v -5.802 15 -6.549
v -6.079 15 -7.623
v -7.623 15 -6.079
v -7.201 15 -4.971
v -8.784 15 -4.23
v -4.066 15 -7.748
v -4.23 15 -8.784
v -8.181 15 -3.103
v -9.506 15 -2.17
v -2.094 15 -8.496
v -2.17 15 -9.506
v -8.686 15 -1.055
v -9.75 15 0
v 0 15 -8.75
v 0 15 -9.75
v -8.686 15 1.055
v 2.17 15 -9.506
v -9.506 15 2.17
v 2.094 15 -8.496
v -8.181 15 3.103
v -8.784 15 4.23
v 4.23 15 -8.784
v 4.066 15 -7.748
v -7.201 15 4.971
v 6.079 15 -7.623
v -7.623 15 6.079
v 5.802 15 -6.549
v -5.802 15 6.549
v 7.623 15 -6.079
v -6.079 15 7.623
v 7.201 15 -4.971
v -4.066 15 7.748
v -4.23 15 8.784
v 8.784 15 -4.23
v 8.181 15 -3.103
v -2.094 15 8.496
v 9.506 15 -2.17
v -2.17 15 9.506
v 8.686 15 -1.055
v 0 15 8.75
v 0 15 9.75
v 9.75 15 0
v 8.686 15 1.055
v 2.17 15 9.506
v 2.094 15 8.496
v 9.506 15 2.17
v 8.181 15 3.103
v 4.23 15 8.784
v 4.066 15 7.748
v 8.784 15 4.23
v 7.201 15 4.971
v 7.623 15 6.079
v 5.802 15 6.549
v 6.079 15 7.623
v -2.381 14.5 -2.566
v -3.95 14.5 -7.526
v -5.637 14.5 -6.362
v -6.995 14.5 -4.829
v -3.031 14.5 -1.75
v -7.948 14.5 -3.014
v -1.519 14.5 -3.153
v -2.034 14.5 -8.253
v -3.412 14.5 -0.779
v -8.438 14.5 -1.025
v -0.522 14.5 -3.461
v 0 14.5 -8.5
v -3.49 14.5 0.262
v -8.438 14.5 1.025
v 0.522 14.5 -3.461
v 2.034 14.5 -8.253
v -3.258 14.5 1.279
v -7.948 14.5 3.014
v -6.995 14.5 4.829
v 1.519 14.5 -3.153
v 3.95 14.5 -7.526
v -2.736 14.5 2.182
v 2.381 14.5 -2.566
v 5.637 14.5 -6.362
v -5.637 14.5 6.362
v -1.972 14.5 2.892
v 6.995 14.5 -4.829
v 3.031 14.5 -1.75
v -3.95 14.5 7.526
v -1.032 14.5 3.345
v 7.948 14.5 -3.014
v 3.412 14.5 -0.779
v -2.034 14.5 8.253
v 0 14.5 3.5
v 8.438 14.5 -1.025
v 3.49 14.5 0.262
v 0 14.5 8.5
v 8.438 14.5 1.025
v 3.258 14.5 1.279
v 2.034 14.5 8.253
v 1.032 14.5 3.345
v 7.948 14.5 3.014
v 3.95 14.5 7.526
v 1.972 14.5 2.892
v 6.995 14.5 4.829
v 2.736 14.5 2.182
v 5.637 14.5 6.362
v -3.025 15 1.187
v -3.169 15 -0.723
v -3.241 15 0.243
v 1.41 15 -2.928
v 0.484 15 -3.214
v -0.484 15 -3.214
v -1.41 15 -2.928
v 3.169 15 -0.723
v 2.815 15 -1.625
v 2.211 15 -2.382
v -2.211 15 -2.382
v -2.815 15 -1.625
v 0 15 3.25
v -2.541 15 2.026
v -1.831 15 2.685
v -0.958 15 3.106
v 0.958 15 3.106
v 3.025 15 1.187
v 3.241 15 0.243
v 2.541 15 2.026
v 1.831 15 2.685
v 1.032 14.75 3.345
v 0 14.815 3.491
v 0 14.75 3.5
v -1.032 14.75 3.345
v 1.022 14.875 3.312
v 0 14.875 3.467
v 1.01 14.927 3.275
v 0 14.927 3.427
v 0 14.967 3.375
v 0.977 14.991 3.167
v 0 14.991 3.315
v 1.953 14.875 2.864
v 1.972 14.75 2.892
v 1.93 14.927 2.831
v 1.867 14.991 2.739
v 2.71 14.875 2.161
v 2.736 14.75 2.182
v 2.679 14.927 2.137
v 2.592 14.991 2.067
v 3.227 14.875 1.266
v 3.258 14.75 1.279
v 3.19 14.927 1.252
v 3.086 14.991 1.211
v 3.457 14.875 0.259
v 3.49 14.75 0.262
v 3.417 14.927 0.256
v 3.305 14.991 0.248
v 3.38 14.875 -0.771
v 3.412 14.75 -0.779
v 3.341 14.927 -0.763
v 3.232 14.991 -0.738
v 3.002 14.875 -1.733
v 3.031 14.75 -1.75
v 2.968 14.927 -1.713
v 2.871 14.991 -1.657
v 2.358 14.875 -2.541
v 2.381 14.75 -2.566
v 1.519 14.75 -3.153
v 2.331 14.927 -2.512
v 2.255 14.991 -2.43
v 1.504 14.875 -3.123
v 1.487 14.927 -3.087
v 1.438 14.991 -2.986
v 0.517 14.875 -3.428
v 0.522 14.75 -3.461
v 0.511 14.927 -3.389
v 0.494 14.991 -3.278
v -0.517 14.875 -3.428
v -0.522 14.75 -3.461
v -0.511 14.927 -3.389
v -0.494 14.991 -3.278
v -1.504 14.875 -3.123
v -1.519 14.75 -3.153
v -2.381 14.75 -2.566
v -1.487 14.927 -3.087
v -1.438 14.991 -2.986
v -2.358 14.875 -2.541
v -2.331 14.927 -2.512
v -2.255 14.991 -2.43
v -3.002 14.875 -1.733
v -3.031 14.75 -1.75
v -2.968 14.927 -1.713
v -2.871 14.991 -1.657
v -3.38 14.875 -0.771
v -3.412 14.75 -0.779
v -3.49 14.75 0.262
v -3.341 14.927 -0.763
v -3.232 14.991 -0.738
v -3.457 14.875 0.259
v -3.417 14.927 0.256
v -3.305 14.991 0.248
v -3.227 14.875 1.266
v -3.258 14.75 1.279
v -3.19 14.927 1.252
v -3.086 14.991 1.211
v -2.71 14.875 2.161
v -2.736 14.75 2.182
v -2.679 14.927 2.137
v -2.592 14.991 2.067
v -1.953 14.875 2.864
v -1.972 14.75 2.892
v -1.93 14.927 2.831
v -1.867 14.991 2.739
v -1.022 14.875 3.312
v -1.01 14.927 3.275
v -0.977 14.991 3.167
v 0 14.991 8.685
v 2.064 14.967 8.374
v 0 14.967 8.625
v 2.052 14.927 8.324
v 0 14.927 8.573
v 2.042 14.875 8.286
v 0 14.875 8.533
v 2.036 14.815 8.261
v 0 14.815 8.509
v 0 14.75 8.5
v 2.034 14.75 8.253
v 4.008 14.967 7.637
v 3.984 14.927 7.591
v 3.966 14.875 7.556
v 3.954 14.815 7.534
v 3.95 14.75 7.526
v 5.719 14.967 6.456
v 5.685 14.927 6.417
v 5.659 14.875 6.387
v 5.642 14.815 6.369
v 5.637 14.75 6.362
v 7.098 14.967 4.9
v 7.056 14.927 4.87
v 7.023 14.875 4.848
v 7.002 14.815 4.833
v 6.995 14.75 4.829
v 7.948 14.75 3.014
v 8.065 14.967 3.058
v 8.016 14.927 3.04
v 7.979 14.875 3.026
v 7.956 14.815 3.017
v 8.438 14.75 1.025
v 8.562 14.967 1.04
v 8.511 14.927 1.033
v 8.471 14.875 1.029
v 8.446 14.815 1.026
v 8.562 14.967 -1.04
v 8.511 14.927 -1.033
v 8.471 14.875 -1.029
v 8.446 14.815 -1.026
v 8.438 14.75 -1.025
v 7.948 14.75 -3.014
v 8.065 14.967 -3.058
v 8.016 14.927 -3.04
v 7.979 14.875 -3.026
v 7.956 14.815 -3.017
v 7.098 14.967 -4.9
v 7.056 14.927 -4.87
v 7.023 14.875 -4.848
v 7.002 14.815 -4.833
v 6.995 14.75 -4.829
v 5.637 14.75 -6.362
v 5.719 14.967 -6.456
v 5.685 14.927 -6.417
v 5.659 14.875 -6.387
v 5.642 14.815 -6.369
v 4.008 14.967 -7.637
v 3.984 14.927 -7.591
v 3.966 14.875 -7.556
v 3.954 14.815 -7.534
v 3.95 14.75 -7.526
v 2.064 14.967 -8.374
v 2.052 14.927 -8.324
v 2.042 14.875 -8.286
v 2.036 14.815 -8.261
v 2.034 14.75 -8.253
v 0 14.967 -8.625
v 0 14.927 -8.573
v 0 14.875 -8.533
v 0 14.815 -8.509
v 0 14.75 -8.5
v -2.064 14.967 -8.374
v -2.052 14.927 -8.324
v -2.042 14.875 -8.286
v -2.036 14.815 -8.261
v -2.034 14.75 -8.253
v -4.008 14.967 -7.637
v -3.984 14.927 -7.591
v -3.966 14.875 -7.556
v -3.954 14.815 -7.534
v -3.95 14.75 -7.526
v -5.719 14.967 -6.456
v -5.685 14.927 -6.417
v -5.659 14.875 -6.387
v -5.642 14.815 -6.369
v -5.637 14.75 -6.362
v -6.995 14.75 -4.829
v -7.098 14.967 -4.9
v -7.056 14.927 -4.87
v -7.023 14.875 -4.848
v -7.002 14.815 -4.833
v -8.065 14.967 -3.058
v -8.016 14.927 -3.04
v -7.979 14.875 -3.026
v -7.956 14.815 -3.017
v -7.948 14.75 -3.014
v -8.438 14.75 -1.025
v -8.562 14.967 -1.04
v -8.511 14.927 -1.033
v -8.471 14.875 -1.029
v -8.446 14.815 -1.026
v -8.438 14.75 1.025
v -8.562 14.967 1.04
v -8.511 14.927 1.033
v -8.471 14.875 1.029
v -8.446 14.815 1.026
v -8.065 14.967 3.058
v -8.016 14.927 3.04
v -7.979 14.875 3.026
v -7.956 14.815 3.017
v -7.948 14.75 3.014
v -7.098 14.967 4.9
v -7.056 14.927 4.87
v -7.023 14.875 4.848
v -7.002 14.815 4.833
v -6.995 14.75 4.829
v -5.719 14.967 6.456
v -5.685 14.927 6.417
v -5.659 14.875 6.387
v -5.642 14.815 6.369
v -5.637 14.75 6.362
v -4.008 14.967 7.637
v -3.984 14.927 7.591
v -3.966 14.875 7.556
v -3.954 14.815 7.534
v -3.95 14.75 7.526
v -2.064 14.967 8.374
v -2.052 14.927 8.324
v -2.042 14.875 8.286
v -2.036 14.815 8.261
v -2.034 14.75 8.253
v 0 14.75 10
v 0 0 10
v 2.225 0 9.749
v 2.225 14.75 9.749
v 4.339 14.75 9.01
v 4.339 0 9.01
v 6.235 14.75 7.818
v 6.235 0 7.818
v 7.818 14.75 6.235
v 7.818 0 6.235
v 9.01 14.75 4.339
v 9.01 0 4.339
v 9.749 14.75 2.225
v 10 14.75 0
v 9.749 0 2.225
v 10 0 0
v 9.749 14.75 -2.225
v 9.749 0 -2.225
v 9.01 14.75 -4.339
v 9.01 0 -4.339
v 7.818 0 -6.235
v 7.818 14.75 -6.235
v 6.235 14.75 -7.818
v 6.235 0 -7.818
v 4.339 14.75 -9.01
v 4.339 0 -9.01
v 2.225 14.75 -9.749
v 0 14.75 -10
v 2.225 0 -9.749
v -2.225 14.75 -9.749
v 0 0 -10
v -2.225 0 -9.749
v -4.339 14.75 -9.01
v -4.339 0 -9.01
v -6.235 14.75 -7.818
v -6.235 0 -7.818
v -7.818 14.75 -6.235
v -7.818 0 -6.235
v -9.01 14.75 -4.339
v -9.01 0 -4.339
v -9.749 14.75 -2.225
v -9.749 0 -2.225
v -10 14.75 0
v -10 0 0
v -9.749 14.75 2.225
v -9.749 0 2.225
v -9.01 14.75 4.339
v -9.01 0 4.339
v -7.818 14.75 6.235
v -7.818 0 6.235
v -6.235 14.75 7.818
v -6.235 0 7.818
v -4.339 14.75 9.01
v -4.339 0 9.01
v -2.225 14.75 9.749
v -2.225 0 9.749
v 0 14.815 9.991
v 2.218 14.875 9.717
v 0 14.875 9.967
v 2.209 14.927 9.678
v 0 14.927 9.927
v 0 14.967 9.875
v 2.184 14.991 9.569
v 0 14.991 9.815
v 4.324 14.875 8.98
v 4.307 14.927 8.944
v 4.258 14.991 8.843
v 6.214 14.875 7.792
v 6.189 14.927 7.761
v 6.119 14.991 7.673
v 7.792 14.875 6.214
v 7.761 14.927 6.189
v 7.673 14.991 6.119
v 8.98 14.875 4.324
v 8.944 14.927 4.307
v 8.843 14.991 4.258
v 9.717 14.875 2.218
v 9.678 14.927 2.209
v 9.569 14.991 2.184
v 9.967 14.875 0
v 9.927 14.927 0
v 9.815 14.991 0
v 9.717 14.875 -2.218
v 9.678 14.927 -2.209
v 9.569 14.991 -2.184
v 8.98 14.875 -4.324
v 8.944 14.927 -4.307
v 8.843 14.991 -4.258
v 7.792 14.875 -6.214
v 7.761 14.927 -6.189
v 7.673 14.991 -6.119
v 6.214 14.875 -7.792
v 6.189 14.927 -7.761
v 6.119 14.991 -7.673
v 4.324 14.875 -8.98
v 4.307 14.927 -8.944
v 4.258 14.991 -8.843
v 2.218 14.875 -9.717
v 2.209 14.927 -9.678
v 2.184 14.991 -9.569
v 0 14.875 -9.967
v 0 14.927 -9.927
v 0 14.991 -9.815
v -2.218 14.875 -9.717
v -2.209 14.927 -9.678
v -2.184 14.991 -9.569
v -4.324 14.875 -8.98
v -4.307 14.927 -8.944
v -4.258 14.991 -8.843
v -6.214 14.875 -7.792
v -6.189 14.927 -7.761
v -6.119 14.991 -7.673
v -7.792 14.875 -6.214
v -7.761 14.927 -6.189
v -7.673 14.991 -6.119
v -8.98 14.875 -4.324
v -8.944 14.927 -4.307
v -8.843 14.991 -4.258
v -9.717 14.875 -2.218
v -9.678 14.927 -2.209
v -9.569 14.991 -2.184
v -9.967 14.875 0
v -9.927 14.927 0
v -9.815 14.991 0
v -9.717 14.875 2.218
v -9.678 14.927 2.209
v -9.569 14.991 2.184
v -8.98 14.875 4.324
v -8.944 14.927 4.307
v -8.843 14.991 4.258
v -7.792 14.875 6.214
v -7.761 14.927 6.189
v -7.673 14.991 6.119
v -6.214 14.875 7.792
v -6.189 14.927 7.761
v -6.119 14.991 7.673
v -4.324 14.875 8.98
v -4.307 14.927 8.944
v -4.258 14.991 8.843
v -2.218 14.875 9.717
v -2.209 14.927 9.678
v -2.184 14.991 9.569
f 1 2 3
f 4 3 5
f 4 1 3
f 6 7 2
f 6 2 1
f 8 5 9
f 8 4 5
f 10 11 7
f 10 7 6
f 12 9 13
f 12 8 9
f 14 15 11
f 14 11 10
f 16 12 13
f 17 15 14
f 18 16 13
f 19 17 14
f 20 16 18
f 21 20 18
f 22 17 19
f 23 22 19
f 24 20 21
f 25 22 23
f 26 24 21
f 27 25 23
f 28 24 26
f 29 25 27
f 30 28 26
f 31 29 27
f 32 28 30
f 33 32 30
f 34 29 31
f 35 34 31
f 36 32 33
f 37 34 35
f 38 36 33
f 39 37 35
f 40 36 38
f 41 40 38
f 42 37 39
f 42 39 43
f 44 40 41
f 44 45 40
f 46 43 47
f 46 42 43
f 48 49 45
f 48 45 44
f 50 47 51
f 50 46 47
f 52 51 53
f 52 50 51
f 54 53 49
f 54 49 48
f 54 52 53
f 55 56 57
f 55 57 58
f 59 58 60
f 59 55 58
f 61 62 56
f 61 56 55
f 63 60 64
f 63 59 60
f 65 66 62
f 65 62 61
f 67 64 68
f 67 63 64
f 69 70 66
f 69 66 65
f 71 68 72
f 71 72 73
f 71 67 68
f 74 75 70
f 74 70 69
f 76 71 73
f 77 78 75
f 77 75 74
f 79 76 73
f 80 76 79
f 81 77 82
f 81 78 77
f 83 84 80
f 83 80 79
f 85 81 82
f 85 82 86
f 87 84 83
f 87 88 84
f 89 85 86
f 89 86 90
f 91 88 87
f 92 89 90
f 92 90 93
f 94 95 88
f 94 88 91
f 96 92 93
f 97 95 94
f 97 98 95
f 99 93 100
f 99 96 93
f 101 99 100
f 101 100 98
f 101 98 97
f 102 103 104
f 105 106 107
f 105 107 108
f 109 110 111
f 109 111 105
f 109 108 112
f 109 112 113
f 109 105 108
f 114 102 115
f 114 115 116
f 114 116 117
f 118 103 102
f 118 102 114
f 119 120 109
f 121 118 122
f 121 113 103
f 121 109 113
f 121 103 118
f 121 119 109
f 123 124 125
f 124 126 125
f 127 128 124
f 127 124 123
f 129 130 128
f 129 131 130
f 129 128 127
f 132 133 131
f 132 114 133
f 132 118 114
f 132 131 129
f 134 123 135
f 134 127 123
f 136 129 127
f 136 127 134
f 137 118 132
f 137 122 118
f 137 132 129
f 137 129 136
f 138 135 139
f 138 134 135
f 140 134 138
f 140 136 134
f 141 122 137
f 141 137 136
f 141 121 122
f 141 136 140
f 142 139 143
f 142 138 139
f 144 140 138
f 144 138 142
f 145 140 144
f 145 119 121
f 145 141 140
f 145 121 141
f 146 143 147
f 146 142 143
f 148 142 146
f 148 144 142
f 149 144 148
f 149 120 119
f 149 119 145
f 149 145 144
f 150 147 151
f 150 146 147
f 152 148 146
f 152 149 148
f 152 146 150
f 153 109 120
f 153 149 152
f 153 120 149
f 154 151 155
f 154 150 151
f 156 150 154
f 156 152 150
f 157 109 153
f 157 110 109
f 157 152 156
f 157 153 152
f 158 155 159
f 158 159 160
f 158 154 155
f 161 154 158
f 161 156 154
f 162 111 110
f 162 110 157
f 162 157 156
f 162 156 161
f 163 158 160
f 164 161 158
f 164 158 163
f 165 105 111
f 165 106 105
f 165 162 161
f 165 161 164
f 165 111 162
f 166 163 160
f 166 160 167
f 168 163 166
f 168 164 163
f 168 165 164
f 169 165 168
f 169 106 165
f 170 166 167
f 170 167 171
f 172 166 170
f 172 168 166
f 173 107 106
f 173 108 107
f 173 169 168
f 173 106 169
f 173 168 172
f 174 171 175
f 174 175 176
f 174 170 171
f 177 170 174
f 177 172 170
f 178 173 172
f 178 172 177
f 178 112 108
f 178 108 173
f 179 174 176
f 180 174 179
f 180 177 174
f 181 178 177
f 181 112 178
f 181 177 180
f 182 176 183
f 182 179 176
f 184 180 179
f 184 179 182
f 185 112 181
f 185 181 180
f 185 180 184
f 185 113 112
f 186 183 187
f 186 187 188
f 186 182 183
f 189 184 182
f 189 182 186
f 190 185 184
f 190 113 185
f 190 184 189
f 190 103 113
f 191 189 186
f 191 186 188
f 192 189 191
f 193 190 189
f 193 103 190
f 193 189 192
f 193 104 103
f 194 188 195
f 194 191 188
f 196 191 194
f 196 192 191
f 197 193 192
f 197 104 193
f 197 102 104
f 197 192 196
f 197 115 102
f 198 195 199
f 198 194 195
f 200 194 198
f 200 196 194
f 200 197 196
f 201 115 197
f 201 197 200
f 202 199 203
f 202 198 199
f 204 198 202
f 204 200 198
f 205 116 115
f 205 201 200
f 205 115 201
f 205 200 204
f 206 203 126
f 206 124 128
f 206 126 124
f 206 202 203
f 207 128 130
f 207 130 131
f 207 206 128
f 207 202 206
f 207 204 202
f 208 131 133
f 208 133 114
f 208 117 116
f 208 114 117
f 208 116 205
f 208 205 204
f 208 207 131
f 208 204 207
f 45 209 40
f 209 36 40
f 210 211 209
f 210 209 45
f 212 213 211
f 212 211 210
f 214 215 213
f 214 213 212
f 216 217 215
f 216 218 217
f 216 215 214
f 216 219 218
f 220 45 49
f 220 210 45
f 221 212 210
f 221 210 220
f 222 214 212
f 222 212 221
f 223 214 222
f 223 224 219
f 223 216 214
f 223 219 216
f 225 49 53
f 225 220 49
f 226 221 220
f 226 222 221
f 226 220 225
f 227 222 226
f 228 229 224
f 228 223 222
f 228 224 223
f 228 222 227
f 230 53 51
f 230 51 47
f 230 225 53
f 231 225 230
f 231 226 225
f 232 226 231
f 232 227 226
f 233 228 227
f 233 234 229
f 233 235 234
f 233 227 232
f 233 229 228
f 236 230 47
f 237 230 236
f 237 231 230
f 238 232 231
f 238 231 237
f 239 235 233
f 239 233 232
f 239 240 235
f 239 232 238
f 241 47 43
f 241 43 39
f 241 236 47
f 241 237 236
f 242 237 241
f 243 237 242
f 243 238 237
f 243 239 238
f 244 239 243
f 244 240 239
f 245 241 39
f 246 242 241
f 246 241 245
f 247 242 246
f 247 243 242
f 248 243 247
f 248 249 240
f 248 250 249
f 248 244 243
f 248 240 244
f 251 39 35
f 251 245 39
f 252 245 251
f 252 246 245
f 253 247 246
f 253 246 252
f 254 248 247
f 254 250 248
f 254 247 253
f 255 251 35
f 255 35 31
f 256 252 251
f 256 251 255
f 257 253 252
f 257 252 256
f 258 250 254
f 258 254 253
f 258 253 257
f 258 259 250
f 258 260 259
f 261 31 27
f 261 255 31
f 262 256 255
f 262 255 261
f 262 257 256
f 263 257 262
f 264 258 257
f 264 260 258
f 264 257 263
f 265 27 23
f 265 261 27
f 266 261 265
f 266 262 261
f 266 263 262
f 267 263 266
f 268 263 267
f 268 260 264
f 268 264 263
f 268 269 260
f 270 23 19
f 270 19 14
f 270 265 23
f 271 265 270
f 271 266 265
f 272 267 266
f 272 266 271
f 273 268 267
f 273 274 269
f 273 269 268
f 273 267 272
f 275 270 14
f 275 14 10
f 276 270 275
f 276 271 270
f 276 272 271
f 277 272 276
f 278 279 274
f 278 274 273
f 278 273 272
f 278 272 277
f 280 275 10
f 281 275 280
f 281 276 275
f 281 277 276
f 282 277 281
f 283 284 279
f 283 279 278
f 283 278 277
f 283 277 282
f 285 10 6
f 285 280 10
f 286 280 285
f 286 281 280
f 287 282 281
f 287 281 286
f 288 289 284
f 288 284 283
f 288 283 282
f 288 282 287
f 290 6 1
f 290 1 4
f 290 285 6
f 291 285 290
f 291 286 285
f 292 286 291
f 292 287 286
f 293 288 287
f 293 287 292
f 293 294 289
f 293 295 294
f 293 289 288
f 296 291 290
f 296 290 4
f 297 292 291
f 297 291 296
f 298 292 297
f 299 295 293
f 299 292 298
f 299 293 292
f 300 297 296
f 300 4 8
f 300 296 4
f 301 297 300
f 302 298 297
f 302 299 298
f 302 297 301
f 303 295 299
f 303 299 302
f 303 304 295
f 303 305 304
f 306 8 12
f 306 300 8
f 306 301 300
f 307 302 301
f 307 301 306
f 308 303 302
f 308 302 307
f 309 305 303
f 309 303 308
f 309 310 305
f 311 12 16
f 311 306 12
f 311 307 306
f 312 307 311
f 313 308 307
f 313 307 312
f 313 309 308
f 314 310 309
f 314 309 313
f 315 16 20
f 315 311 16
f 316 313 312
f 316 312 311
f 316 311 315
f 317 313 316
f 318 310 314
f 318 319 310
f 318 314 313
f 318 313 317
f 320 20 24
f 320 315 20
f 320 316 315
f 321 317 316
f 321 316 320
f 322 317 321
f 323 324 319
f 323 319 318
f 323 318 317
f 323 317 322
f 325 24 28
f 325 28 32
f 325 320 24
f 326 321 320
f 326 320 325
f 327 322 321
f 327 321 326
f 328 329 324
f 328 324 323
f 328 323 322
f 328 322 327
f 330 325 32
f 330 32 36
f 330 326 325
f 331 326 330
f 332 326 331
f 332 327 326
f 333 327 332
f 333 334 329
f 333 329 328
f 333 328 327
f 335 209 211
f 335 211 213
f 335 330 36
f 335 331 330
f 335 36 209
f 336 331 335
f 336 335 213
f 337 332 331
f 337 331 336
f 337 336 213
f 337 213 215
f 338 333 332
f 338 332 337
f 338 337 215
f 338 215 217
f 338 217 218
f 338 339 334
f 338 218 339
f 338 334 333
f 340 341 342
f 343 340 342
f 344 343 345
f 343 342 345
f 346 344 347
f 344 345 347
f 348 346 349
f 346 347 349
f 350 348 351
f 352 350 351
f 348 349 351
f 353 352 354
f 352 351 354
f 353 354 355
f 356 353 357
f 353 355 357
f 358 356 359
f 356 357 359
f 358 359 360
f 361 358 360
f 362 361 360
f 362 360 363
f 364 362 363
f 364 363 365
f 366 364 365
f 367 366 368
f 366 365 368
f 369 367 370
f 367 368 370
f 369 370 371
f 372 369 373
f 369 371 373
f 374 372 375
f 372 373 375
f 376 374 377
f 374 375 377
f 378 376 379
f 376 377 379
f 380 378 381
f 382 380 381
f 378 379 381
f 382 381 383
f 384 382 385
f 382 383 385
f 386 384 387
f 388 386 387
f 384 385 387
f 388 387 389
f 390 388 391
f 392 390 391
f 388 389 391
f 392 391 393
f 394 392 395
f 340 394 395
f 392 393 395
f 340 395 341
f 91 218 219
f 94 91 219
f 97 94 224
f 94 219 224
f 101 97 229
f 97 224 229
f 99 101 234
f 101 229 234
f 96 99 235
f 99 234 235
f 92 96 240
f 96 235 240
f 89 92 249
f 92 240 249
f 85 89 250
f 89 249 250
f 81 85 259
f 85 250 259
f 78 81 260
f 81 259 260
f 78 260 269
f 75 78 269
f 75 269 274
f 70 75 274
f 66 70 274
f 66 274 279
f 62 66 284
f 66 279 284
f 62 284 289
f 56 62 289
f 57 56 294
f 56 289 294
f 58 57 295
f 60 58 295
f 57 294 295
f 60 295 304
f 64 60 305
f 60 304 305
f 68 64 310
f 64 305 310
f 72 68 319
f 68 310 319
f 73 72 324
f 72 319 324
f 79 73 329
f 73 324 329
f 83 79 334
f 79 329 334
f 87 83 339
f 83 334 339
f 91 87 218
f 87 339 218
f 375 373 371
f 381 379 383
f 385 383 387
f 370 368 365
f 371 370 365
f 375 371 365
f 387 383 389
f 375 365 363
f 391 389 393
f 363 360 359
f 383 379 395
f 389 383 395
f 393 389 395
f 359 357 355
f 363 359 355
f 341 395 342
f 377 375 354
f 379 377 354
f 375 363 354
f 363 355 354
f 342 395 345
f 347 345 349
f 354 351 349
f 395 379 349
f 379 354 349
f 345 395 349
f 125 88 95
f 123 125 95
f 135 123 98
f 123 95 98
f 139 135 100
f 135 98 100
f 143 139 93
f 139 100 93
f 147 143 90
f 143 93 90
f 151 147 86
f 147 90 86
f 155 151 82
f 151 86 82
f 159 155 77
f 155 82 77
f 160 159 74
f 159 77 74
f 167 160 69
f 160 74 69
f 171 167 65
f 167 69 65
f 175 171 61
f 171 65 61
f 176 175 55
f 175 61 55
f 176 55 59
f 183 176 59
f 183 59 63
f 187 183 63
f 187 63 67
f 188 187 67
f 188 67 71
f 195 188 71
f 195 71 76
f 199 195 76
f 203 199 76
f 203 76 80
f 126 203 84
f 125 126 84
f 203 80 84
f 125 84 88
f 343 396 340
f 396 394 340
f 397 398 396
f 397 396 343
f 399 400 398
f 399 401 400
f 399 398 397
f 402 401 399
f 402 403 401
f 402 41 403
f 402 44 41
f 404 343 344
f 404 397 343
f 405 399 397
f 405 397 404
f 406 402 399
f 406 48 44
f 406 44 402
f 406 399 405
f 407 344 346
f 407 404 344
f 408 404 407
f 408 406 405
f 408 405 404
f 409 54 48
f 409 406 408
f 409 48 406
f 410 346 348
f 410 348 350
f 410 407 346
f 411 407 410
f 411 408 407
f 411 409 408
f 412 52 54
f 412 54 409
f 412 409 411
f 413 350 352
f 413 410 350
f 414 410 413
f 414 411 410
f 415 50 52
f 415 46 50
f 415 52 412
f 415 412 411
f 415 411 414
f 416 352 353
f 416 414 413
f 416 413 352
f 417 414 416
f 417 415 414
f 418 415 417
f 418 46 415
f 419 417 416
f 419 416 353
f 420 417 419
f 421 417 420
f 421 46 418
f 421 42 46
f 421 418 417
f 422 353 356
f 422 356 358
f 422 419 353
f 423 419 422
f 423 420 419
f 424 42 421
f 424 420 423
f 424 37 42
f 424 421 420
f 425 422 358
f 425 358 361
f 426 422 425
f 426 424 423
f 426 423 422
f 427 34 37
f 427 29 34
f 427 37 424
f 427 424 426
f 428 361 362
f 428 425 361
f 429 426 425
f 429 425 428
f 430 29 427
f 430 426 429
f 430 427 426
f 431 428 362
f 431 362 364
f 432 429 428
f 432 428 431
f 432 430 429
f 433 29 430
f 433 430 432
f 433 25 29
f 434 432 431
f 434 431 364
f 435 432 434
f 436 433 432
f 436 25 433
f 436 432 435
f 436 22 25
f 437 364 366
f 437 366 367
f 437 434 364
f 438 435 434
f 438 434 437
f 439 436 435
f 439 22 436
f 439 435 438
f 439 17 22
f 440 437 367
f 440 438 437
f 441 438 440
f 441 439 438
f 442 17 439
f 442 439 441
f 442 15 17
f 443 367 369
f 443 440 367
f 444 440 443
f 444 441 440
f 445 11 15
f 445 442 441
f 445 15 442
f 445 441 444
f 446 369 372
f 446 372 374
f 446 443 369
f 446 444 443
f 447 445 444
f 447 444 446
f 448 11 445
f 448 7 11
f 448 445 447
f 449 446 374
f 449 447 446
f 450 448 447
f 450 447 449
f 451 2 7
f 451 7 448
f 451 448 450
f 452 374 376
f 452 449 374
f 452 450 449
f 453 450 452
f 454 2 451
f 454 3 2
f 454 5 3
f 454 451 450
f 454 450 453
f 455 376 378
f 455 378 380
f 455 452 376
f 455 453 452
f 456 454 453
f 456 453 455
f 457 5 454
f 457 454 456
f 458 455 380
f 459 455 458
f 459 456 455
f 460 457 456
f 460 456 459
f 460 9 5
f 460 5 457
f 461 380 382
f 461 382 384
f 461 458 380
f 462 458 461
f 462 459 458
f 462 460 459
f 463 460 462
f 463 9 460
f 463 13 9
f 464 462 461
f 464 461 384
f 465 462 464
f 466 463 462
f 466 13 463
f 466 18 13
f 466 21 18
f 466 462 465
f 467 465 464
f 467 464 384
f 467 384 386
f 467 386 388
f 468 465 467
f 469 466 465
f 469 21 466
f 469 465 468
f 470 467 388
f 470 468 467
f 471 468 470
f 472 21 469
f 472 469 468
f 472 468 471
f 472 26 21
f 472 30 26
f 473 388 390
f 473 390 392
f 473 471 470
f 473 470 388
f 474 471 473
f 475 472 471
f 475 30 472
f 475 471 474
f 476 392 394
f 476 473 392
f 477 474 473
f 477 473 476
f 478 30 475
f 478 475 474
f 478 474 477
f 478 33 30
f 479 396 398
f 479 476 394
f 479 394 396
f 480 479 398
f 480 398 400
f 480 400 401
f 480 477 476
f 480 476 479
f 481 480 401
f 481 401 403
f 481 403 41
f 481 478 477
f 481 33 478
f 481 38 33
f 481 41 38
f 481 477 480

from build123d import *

# Parameters (mm, degrees)
SKETCH1_R           = 10
BOSS_EXTRUDE1_DEPTH = 15
SKETCH2_R           = 8.5
CUT_EXTRUDE1_DEPTH  = 0.5
SKETCH3_R           = 3.5
BOSS_EXTRUDE2_DEPTH = 0.5
FILLET1_R           = 0.25


with BuildPart() as part:
    # Sketch1 → Boss-Extrude1 (new body)
    with BuildSketch(Plane(origin=(0, 0, 0), x_dir=(1, 0, 0), z_dir=(0, 1, 0))):
        with Locations(Location((0, 0, 0), (0, 0, 270))):
            Circle(SKETCH1_R)
    extrude(amount=BOSS_EXTRUDE1_DEPTH)

    # Sketch2 → Cut-Extrude1 (cut)
    with BuildSketch(Plane(origin=(0, 15, 0), x_dir=(1, 0, 0), z_dir=(0, 1, 0))):
        with Locations(Location((0, 0, 0), (0, 0, 270))):
            Circle(SKETCH2_R)
    extrude(amount=-CUT_EXTRUDE1_DEPTH, mode=Mode.SUBTRACT)

    # Sketch3 → Boss-Extrude2 (add)
    with BuildSketch(Plane(origin=(0, 14.5, 0), x_dir=(1, 0, 0), z_dir=(0, 1, 0))):
        with Locations(Location((0, 0, 0), (0, 0, 270))):
            Circle(SKETCH3_R)
    extrude(amount=BOSS_EXTRUDE2_DEPTH)

    # Fillet1
    fillet1_edges = [part.edges().sort_by_distance(p)[0] for p in [
        (0, 15, -3.5),
        (0, 15, -10),
        (0, 15, -8.5),
    ]]
    fillet(fillet1_edges, radius=FILLET1_R)


solid = part.part
